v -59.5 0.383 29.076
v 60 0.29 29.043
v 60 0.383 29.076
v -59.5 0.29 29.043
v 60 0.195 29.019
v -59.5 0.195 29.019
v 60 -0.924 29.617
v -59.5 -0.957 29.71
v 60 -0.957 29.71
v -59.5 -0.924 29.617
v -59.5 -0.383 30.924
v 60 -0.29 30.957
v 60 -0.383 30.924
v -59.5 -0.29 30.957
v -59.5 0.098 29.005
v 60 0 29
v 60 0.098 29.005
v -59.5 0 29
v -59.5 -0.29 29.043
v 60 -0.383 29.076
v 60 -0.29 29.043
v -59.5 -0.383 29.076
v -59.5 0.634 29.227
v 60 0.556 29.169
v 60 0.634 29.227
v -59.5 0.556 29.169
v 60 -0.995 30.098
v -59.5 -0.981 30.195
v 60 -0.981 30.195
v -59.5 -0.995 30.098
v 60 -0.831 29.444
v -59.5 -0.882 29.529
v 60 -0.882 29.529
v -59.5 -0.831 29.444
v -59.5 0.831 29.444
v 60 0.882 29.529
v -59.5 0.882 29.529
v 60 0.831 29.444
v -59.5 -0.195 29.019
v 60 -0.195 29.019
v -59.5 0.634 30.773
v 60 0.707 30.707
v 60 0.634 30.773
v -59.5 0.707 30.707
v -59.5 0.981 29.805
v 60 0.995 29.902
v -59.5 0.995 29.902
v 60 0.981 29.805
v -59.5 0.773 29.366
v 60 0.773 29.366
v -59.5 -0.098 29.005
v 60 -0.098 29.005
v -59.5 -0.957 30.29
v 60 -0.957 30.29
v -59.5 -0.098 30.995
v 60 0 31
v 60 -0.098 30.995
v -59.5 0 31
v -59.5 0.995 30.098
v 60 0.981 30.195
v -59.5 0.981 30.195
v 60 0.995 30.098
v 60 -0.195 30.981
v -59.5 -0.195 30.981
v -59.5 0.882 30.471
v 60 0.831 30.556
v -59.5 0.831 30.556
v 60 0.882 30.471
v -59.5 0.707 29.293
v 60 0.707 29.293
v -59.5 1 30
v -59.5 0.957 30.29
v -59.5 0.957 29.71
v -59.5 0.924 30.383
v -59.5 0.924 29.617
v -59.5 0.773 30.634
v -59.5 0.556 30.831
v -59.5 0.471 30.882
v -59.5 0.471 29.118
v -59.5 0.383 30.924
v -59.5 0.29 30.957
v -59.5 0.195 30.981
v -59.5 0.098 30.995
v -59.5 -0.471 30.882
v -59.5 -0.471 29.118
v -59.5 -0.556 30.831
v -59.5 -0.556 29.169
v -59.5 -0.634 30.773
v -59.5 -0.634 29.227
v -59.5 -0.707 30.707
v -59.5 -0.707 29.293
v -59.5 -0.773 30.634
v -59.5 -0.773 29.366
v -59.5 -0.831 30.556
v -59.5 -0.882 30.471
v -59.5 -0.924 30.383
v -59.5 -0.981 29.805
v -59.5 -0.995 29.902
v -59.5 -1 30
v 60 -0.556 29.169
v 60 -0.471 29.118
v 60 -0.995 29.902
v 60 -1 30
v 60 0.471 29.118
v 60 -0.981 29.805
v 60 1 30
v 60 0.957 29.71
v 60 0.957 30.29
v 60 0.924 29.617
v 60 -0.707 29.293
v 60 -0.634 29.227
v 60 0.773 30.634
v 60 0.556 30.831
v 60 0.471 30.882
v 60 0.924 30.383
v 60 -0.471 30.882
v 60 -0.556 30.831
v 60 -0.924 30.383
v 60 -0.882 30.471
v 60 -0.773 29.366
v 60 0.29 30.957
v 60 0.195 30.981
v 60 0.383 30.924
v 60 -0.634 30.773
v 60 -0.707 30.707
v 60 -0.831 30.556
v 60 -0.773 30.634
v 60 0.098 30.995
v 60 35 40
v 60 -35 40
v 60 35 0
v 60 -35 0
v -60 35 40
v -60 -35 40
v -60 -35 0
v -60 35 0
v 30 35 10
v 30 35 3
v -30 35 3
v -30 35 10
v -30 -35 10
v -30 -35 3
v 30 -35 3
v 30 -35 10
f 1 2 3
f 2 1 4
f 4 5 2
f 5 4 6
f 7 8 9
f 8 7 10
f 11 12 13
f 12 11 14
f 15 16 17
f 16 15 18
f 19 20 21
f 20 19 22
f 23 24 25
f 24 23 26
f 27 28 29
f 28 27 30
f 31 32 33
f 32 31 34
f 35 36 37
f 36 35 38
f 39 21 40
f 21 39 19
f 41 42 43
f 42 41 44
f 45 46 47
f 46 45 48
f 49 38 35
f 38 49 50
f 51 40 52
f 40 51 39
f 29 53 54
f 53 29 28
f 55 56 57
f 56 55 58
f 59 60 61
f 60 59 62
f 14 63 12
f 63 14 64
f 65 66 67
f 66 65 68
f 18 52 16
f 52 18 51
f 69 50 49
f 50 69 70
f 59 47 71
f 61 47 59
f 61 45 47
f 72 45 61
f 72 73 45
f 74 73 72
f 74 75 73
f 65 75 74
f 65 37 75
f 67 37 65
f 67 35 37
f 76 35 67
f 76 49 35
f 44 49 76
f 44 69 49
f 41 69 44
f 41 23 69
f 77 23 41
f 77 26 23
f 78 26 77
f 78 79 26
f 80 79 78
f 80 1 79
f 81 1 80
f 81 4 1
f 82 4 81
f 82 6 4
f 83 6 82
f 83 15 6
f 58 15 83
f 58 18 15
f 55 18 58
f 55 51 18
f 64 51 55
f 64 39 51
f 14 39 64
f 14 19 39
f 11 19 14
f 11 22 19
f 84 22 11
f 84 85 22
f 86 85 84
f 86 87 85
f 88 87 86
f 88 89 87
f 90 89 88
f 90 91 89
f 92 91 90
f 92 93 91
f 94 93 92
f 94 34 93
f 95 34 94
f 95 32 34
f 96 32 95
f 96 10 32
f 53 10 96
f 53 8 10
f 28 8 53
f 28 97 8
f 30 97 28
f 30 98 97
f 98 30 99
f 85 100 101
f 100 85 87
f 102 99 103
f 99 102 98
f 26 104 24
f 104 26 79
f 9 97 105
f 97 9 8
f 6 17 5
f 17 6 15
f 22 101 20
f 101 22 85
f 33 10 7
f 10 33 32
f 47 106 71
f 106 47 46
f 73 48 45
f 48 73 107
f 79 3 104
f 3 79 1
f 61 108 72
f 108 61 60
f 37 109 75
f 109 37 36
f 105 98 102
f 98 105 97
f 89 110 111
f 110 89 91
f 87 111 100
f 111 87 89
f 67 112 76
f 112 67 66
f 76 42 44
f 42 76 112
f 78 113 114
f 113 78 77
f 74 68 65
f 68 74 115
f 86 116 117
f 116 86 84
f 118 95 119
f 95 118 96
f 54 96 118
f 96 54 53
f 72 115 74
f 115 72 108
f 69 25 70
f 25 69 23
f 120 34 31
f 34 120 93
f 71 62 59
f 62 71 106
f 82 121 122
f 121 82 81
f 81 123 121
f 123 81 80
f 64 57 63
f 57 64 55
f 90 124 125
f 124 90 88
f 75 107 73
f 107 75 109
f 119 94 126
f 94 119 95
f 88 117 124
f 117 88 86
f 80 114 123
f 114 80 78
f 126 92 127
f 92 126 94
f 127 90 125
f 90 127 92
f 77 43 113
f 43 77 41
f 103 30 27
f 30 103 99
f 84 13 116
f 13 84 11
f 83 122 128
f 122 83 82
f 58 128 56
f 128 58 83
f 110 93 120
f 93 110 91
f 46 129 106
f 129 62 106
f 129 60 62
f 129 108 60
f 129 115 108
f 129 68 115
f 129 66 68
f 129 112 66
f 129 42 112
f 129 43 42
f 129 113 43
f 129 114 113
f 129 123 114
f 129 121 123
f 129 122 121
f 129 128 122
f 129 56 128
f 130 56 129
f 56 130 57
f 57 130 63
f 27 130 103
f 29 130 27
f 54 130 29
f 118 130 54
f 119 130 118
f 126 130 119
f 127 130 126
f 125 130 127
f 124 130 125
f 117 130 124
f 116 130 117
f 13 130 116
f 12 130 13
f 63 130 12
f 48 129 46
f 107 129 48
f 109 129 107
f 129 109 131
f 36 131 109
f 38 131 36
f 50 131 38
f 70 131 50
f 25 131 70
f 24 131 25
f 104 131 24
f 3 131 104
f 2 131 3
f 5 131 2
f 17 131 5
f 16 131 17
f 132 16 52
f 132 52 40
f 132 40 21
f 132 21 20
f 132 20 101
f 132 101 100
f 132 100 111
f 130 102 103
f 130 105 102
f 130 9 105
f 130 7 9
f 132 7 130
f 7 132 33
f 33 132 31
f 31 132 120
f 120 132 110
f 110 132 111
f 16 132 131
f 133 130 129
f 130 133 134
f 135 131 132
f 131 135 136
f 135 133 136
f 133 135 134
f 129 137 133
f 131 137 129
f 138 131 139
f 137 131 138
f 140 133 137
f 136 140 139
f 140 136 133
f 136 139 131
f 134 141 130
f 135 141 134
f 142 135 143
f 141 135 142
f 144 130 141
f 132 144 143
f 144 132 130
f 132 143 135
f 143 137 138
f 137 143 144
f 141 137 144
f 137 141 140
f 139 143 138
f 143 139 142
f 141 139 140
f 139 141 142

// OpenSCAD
// Mini horizontal gel-electrophoresis buffer tank
// Print orientation: open top facing up, resting on XY plane at z = 0

// ---------------- Parameters ----------------
tank_x      = 120;   // outer length along X (mm)
tank_y      = 70;    // outer width along Y (mm)
tank_h      = 40;    // outer height along Z (mm)

wall        = 3;     // wall thickness (mm)
floor       = 3;     // floor thickness under chambers (mm)

platform_x  = 60;    // platform length along X (mm), centred
platform_y  = tank_y; // platform spans full inner width (mm)
platform_top = 10;   // platform top height above tank floor (mm)

hole_d      = 2;     // electrode hole diameter (mm)
hole_y      = 0;     // electrode hole Y position (mm)
hole_z      = 30;    // electrode hole Z position (mm)

eps         = 0.5;   // cutter overshoot past faces (mm)

$fn = 64;

// ---------------- Derived ----------------
inner_x = tank_x - 2 * wall;   // inner floor length along X
inner_y = tank_y - 2 * wall;   // inner width along Y
floor_t = floor;               // floor thickness under chambers
plat_t  = platform_top - floor_t; // platform thickness above floor

// ---------------- Model ----------------
difference() {
    // Main tank body (open top)
    translate([-tank_x / 2, -tank_y / 2, 0])
        cube([tank_x, tank_y, tank_h]);

    // Central raised platform for gel tray
    translate([-platform_x / 2, -platform_y / 2, floor_t])
        cube([platform_x, platform_y, plat_t]);

    // Horizontal electrode holes through each end wall along X
    for (s = [-1, 1])
        translate([s * (tank_x / 2 - eps), hole_y, hole_z])
            rotate([0, 90, 0])
                cylinder(d = hole_d, h = tank_x + 2 * eps);
}
